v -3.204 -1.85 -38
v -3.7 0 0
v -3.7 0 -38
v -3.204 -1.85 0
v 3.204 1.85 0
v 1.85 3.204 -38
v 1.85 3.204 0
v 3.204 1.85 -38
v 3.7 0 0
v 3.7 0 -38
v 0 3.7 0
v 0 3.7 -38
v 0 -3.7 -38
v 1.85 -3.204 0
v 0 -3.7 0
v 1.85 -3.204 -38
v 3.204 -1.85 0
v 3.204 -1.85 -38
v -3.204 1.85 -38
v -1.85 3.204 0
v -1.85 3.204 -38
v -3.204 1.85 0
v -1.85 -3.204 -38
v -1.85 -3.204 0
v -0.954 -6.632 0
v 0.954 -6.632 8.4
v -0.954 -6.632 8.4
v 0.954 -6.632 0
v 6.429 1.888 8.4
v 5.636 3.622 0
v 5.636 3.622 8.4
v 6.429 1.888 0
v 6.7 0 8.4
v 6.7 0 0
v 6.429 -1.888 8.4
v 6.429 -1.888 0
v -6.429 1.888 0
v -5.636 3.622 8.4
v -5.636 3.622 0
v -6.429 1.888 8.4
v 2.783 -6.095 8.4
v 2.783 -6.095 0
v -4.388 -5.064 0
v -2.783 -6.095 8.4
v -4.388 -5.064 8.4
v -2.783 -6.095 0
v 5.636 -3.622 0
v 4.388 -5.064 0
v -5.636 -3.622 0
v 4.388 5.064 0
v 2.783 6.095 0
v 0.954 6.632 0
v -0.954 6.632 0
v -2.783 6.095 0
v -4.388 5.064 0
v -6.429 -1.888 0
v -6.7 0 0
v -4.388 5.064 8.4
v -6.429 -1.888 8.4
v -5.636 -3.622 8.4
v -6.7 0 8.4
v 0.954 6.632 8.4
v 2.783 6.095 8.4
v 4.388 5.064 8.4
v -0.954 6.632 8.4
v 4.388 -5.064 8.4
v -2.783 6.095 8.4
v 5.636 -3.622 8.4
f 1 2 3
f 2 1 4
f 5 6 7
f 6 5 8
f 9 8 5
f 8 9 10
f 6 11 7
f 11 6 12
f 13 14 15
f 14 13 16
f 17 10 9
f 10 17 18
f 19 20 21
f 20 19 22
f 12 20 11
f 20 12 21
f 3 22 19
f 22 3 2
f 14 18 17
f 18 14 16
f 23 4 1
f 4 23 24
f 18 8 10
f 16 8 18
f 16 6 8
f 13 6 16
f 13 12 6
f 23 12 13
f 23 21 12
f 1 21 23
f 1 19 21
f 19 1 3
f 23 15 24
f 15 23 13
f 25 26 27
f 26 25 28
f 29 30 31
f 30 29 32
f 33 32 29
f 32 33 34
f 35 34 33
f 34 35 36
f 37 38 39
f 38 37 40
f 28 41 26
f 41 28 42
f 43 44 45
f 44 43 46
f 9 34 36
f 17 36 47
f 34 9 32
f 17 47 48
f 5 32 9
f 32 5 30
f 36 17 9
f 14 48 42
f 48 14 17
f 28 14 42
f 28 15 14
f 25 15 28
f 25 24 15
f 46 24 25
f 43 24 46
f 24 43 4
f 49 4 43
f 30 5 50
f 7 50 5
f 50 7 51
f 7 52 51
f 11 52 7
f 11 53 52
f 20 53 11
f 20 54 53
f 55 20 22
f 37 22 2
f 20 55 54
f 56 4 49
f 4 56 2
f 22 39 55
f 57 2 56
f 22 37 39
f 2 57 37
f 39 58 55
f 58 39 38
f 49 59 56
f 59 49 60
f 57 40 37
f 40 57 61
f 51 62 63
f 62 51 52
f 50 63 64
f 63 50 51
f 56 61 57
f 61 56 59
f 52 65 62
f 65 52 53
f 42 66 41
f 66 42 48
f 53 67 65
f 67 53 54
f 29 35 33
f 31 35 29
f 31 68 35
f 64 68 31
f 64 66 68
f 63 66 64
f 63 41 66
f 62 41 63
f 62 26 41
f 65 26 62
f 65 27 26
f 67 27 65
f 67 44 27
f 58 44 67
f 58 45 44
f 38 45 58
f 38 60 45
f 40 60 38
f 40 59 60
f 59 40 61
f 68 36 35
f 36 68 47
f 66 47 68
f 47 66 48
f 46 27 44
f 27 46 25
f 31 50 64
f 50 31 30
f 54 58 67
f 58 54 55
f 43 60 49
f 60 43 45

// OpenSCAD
function M8x30BoltDiameter()= 7;
function M8x30BoltLength()= 38;
function M8x30BoltHeadDiameter()= 13;
function M8x30BoltHeadHeight()= 8;

//err on the side of larger tolerances for bolts

module M8x30Bolt(3dPrinterTolerance=.4)
{
	union()
	{
		translate([0,0,-M8x30BoltLength()])
		{
			cylinder(M8x30BoltLength()+3dPrinterTolerance, (M8x30BoltDiameter()+3dPrinterTolerance)/2,(M8x30BoltDiameter()+ 3dPrinterTolerance)/2);
		}
		cylinder(M8x30BoltHeadHeight()+3dPrinterTolerance, (M8x30BoltHeadDiameter()+3dPrinterTolerance)/2,(M8x30BoltHeadDiameter()+3dPrinterTolerance)/2);
	}
}

M8x30Bolt();
